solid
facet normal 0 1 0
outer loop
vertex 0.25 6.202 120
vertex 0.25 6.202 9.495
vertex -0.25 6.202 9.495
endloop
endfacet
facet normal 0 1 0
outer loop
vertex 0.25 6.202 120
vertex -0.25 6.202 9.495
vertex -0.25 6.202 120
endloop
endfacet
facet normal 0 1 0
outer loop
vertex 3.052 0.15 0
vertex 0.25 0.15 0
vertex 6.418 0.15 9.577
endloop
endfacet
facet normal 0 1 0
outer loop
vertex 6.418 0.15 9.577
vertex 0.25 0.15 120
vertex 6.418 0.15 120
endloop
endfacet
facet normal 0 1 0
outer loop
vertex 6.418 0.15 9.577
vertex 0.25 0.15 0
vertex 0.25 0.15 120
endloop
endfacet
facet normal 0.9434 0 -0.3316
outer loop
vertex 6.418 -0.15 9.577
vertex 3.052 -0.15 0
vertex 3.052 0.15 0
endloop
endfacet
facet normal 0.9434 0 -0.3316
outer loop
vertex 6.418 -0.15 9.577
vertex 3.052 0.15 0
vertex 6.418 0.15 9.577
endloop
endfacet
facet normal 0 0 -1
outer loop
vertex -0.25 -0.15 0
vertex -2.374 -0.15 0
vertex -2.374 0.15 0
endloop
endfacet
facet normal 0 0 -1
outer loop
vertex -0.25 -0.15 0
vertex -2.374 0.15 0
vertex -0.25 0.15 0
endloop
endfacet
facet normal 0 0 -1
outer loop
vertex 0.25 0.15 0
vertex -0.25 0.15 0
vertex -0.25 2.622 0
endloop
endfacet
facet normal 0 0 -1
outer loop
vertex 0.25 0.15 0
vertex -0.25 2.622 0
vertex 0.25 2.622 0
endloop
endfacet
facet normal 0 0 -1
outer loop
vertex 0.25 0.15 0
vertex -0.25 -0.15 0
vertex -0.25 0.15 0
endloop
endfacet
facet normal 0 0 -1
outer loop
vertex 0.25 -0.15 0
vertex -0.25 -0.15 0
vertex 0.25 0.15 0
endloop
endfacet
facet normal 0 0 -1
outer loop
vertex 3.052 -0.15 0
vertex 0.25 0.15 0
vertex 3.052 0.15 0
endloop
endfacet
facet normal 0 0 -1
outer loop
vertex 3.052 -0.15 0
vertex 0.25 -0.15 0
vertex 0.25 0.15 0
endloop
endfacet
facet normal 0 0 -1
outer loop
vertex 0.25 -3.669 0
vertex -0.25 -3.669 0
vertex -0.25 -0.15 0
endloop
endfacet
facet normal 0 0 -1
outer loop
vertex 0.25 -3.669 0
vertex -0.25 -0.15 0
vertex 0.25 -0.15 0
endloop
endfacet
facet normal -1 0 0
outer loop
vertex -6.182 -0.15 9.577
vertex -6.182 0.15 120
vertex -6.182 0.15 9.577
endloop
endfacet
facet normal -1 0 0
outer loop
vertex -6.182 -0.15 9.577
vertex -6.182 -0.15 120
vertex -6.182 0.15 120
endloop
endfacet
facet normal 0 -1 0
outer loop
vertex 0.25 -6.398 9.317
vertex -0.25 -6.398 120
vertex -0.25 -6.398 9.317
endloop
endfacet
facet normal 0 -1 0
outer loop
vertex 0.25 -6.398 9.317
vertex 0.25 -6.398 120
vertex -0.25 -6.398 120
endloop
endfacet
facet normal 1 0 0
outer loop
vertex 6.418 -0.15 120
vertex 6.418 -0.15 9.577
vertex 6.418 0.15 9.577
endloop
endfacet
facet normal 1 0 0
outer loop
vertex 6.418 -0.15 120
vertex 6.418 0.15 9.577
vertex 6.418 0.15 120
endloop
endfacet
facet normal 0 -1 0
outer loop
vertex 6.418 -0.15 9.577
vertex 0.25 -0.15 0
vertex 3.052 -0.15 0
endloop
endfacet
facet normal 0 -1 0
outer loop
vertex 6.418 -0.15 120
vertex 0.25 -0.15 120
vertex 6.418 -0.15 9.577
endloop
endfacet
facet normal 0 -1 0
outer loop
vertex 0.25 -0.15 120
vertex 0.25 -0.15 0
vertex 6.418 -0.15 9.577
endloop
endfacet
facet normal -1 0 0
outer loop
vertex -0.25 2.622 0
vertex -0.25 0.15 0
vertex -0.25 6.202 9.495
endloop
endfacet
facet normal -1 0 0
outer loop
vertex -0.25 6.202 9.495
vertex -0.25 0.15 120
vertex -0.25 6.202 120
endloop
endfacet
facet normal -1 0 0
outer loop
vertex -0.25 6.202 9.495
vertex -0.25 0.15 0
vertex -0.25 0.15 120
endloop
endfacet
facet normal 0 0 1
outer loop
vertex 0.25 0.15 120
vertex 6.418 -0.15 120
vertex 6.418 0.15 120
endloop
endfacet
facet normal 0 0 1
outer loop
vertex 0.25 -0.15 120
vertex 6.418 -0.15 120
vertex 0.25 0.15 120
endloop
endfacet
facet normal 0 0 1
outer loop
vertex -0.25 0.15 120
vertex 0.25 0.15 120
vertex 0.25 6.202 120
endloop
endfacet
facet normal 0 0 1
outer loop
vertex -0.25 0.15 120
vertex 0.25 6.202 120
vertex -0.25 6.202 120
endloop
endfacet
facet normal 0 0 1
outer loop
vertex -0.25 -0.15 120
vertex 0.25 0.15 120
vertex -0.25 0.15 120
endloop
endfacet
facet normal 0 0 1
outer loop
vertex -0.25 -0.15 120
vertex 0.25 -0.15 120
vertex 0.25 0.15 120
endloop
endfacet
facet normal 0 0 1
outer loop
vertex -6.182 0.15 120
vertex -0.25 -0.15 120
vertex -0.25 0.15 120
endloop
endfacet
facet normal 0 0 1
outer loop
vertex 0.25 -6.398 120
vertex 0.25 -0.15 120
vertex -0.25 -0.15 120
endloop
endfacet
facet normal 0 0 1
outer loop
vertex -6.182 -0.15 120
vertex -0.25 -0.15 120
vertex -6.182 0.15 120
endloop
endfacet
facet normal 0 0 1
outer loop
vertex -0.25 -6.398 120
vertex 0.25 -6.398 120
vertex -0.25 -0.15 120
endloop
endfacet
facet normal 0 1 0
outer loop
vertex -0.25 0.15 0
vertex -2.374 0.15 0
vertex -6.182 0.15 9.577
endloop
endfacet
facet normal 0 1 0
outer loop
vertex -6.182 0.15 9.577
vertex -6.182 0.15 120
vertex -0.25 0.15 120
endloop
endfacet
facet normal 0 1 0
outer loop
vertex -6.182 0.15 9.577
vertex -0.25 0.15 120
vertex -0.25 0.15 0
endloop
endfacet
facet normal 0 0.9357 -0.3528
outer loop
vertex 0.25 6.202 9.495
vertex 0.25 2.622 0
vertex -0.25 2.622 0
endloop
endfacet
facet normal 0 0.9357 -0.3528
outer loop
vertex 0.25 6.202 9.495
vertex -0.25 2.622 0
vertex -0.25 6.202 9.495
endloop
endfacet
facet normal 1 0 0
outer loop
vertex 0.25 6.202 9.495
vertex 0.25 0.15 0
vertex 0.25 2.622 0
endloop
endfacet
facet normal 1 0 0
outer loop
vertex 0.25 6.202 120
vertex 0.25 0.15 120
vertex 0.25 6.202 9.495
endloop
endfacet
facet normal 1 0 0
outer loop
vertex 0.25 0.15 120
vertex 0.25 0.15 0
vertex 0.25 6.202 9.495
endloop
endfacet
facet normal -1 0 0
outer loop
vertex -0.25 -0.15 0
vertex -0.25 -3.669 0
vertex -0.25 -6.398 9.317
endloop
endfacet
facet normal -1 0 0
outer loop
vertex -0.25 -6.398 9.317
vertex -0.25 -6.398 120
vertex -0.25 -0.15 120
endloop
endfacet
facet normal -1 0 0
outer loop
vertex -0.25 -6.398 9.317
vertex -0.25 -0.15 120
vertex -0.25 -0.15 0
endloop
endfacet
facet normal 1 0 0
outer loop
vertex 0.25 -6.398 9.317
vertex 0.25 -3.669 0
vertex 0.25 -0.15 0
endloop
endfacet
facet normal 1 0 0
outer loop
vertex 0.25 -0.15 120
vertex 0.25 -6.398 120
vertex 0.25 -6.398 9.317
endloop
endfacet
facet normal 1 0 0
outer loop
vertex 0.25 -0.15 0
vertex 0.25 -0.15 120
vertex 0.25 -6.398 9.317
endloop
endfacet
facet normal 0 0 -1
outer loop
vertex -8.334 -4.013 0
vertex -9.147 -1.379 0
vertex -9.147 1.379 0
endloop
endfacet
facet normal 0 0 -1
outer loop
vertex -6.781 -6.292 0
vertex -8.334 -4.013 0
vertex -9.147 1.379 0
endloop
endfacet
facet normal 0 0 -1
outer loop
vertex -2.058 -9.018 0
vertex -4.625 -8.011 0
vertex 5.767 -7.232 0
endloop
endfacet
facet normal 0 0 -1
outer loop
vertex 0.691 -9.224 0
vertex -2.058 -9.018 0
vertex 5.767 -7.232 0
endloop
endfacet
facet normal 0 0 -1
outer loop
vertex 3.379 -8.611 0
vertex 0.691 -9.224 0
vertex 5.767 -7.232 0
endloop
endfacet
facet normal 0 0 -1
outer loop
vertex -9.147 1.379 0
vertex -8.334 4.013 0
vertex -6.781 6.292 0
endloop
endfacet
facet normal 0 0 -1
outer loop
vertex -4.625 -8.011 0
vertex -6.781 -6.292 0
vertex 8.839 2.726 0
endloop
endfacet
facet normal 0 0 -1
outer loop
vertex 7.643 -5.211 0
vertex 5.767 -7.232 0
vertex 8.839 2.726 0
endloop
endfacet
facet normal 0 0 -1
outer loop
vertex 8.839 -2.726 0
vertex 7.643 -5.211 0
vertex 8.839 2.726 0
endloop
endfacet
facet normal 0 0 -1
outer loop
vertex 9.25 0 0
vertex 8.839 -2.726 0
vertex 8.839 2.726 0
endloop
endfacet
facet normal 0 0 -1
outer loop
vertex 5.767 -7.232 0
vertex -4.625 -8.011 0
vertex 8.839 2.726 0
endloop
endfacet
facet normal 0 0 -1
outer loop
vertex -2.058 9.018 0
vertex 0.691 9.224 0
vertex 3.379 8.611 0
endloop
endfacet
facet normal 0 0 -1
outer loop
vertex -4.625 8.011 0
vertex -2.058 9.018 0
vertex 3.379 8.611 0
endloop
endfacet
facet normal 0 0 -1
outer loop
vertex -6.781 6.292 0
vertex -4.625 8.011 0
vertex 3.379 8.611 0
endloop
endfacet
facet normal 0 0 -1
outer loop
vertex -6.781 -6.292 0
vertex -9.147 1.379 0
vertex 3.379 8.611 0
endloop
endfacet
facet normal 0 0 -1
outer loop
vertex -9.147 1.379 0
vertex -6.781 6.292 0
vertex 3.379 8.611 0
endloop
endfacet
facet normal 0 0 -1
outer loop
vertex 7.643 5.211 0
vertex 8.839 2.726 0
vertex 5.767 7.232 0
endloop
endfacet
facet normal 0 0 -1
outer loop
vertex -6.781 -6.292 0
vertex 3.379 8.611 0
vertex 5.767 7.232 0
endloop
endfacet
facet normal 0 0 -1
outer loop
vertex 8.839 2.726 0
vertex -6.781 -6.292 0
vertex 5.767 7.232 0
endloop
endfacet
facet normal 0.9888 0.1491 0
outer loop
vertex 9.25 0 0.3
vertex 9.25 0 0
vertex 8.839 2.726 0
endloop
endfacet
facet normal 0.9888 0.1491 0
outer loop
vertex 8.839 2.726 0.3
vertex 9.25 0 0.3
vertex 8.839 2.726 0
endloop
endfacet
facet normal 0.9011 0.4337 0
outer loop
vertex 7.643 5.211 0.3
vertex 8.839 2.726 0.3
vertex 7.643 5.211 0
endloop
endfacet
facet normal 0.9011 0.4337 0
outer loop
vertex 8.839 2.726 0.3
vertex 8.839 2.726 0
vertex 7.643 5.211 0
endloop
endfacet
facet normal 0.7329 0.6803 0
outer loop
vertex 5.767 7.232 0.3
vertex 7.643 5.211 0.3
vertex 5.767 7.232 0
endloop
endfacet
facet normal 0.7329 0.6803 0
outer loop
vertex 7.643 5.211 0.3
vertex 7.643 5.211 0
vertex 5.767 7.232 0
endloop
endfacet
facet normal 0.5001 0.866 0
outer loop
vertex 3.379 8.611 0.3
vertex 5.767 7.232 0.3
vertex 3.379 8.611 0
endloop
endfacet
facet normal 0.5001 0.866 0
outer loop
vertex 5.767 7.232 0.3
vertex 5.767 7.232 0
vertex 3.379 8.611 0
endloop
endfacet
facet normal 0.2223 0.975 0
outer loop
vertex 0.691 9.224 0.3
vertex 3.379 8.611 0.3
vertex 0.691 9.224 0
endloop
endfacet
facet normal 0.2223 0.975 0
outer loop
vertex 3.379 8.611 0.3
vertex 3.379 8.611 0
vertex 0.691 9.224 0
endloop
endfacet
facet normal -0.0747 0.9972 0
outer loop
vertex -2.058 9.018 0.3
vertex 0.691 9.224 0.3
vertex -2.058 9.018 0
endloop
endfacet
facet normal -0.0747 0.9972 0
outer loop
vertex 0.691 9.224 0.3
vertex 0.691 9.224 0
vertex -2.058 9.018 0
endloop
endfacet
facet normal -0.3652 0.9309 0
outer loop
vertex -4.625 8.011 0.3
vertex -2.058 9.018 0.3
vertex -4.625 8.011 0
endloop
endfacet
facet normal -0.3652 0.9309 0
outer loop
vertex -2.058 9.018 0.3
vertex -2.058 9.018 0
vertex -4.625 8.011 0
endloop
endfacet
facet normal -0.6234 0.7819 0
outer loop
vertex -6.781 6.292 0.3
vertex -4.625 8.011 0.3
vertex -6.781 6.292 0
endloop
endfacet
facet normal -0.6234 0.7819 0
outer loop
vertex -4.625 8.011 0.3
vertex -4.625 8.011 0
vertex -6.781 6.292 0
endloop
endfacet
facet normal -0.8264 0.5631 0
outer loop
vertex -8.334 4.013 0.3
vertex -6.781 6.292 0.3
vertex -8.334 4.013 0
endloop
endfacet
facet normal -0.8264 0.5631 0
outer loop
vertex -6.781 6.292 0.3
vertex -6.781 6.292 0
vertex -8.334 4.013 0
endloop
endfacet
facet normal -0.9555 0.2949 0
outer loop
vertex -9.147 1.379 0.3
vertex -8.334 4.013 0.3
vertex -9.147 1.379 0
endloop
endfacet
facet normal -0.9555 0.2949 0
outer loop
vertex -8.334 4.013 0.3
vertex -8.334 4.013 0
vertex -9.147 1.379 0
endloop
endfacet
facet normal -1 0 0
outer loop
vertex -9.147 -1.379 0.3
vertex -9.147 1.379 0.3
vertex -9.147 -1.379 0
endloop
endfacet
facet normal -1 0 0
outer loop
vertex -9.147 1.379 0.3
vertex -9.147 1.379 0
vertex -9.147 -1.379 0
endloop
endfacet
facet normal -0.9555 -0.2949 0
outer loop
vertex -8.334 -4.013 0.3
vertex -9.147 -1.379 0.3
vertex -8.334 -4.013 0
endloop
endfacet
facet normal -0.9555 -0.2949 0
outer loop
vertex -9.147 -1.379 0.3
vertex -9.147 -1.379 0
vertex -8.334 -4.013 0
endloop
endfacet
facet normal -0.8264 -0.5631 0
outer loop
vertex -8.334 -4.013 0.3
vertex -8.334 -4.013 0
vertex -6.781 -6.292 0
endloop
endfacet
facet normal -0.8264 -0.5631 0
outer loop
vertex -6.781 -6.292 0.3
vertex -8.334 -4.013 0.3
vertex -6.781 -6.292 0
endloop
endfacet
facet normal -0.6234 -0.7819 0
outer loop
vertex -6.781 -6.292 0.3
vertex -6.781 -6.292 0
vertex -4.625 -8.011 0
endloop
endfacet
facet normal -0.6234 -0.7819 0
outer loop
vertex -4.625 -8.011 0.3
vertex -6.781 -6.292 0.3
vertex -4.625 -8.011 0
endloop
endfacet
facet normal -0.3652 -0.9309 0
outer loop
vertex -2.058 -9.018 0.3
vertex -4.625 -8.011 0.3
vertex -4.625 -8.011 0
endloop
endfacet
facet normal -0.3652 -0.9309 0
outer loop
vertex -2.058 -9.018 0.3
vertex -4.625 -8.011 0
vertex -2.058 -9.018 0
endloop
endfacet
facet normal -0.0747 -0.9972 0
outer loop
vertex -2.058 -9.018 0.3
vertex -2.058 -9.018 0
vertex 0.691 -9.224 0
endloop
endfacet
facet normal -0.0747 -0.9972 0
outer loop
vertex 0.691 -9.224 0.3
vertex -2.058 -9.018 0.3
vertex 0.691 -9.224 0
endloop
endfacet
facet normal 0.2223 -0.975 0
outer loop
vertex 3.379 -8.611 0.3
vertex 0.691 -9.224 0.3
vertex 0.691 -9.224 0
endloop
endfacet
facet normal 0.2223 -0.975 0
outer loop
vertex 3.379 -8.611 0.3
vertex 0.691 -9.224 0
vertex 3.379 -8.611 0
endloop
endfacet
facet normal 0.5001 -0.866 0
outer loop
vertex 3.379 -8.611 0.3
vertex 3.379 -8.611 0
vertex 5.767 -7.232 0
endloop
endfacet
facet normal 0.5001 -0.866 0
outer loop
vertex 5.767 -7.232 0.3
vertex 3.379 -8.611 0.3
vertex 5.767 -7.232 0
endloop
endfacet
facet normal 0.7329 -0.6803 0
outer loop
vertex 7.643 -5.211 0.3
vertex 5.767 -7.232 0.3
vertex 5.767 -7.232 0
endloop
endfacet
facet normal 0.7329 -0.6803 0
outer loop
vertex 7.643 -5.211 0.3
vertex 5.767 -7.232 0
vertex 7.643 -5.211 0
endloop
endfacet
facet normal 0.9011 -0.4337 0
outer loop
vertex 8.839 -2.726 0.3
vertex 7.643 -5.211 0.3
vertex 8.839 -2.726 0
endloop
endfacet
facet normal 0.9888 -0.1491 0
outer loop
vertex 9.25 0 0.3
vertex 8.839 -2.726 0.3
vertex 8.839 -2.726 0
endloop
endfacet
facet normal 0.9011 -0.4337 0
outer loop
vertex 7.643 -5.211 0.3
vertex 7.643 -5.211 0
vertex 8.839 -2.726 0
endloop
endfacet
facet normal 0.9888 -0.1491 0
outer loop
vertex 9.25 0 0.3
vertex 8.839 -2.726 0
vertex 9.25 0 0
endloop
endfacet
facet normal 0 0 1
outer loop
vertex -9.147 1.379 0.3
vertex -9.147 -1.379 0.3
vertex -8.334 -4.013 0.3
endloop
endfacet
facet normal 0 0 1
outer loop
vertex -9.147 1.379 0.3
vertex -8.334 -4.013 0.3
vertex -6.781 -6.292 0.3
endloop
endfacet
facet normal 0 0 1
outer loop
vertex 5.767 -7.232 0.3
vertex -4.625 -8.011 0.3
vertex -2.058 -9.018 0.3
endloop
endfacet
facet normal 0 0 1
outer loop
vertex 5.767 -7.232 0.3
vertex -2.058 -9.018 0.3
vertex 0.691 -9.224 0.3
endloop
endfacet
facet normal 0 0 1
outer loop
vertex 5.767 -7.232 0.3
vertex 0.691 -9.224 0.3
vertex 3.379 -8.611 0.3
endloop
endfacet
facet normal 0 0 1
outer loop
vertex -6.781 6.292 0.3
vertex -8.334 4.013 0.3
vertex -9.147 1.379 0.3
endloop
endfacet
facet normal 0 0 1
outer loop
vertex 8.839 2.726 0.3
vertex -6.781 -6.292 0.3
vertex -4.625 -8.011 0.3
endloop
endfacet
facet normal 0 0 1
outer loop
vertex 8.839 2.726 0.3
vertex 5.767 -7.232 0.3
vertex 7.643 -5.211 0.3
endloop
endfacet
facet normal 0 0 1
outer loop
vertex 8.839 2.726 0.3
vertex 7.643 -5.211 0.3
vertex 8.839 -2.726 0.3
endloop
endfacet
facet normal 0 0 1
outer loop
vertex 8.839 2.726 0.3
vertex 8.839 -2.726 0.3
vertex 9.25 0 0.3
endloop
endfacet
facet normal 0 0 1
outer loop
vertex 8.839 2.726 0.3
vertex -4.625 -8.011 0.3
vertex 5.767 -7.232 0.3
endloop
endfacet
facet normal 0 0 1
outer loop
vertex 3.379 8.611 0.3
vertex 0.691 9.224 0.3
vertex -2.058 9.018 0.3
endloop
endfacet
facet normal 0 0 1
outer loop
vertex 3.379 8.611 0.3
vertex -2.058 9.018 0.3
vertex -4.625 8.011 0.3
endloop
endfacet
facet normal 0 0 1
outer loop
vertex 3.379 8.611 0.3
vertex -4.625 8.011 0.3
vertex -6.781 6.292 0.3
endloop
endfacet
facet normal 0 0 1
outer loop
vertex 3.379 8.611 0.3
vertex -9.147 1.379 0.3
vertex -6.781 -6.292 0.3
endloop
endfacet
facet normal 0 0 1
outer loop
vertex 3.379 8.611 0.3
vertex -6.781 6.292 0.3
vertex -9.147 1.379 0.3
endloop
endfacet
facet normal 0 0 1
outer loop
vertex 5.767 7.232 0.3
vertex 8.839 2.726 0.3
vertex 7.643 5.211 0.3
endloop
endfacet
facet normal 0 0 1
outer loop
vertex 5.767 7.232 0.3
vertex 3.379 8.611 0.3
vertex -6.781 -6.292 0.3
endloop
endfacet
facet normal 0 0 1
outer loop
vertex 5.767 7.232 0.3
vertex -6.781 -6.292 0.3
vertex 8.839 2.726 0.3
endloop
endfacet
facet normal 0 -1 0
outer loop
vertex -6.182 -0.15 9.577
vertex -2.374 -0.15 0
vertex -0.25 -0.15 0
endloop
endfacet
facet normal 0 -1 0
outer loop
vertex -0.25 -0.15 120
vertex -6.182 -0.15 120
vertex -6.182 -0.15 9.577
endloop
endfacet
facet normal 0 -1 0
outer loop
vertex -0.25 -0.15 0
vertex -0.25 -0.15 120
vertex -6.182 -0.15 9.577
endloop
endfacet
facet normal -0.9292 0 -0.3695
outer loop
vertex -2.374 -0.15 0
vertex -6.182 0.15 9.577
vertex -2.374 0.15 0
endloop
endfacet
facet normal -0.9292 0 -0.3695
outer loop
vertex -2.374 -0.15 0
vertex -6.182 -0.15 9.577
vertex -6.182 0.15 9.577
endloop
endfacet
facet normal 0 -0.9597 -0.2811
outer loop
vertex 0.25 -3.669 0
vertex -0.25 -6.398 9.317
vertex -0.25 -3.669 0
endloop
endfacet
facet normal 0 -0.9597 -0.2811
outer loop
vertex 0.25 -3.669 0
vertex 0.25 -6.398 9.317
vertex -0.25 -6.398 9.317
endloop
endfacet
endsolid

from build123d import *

# Parameters (mm, degrees)
F0_R     = 9.25
F3_DEPTH = 0.3
F4_DEPTH = 0.25
F5_DEPTH = 0.15


with BuildPart() as f3:
    # F0 (on Top) → F3 (new body)
    with BuildSketch(Plane.XY):
        Circle(F0_R)
    extrude(amount=F3_DEPTH)


with BuildPart() as f4:
    # F1 (on Right) → F4 (new body, symmetric)
    with BuildSketch(Plane.YZ):
        Polygon((-6.3975099474, 9.3173701316), (-3.669354599, 0), (2.6220979635, 0), (6.2024900526, 9.4951791689), (6.2024900526, 120), (-6.3975099474, 120), align=None)
    extrude(amount=F4_DEPTH, both=True)

    # F2 (on Front) → F5 (join, symmetric)
    with BuildSketch(Plane.XZ):
        Polygon((-6.1816425862, 9.5772715285), (-2.373900963, 0), (3.051972948, 0), (6.4183574138, 9.5772715285), (6.4183574138, 120), (-6.1816425862, 120), align=None)
    extrude(amount=F5_DEPTH, both=True)


solid = Compound([f3.part, f4.part])
